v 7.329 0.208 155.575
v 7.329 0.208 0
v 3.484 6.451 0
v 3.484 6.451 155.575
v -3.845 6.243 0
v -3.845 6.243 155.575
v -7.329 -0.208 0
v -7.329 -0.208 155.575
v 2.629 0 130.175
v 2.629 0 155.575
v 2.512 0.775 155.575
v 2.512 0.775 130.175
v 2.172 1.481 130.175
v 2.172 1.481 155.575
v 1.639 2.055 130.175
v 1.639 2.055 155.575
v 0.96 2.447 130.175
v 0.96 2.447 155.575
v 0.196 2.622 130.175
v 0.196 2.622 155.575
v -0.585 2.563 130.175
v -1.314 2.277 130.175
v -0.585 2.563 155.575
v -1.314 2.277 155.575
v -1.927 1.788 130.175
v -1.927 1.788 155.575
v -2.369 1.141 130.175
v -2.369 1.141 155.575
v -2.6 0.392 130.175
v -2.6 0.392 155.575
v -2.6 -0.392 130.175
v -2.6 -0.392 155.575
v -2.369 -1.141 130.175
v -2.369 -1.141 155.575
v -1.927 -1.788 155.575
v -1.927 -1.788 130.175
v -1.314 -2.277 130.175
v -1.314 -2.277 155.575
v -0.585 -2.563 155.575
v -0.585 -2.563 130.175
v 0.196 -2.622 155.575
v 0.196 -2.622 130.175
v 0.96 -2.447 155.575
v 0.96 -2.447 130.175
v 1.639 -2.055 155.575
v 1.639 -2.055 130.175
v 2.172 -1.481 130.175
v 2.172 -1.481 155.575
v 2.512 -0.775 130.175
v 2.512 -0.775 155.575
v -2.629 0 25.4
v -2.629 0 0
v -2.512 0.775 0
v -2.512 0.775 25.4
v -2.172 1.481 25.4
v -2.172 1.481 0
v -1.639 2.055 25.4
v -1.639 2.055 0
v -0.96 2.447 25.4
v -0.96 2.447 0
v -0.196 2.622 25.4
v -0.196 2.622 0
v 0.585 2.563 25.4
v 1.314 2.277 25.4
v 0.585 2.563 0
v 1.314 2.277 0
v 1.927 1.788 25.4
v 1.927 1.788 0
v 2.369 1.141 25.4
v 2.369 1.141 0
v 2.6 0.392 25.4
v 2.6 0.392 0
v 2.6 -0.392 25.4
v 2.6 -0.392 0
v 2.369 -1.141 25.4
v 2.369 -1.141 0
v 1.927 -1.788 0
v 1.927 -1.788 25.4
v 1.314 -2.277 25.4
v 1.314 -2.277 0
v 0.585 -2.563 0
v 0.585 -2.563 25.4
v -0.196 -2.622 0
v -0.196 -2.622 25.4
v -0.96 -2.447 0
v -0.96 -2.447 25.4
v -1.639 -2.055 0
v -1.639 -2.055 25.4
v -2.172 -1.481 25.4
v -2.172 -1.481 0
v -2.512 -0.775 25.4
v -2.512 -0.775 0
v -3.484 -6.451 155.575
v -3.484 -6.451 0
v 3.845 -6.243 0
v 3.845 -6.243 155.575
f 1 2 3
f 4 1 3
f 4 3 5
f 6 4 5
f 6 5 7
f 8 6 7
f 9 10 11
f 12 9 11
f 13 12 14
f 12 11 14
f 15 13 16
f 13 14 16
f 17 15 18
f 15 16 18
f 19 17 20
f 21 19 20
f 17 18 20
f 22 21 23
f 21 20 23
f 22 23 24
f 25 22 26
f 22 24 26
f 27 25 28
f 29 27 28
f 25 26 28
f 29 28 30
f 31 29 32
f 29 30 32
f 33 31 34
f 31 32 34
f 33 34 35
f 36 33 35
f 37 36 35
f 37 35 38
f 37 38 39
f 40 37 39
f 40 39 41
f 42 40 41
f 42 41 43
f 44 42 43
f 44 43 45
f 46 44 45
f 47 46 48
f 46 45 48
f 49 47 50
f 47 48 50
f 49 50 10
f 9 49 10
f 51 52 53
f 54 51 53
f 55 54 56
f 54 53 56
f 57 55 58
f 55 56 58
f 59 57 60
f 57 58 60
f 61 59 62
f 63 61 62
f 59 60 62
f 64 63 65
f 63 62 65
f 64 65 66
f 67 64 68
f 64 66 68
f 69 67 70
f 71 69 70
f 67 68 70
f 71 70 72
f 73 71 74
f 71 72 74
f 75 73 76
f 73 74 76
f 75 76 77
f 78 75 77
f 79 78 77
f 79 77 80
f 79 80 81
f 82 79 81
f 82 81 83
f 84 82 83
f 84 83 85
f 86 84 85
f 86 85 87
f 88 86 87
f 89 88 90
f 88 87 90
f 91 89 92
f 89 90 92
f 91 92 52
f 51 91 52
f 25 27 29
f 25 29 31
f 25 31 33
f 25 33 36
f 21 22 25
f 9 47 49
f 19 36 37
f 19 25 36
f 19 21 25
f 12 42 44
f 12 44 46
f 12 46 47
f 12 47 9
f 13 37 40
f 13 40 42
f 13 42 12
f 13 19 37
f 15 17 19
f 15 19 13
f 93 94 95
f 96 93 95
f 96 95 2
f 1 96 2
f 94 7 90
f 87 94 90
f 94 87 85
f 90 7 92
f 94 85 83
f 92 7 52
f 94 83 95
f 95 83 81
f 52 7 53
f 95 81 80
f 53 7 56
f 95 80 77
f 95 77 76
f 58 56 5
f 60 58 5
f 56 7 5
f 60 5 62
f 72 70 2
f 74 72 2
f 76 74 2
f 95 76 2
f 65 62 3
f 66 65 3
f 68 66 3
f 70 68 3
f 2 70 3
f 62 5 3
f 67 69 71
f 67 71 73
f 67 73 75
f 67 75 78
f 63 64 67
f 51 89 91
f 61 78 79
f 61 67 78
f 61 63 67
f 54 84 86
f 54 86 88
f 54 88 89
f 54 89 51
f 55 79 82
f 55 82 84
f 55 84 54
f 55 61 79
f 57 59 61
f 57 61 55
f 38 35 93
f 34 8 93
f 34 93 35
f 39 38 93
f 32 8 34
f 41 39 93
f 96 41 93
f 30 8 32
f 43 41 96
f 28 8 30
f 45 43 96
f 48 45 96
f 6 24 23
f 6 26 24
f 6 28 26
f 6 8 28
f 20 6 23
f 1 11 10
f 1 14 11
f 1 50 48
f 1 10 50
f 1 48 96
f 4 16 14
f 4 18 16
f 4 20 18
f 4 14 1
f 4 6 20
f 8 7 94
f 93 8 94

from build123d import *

# Parameters (mm, degrees)
BOSS_EXTRUDE1_DEPTH = 155.575
SKETCH3_R           = 2.6289
CUT_EXTRUDE2_DEPTH  = 25.4
SKETCH4_R           = 2.6289
CUT_EXTRUDE3_DEPTH  = 25.4


with BuildPart() as part:
    # Sketch1 → Boss-Extrude1 (new body)
    with BuildSketch(Plane.XY):
        Polygon((3.484491601, 6.45148445), (-3.844903625, 6.243400471), (-7.329395227, -0.208083979), (-3.484491601, -6.45148445), (3.844903625, -6.243400471), (7.329395227, 0.208083979), align=None)
    extrude(amount=BOSS_EXTRUDE1_DEPTH)

    # Sketch3 → Cut-Extrude2 (cut)
    with BuildSketch(Plane.XY.offset(155.575)):
        Circle(SKETCH3_R)
    extrude(amount=-CUT_EXTRUDE2_DEPTH, mode=Mode.SUBTRACT)

    # Sketch4 → Cut-Extrude3 (cut)
    with BuildSketch(Plane(origin=(0, 0, 0), x_dir=(-1, 0, 0), z_dir=(0, 0, -1))):
        Circle(SKETCH4_R)
    extrude(amount=-CUT_EXTRUDE3_DEPTH, mode=Mode.SUBTRACT)


solid = part.part
